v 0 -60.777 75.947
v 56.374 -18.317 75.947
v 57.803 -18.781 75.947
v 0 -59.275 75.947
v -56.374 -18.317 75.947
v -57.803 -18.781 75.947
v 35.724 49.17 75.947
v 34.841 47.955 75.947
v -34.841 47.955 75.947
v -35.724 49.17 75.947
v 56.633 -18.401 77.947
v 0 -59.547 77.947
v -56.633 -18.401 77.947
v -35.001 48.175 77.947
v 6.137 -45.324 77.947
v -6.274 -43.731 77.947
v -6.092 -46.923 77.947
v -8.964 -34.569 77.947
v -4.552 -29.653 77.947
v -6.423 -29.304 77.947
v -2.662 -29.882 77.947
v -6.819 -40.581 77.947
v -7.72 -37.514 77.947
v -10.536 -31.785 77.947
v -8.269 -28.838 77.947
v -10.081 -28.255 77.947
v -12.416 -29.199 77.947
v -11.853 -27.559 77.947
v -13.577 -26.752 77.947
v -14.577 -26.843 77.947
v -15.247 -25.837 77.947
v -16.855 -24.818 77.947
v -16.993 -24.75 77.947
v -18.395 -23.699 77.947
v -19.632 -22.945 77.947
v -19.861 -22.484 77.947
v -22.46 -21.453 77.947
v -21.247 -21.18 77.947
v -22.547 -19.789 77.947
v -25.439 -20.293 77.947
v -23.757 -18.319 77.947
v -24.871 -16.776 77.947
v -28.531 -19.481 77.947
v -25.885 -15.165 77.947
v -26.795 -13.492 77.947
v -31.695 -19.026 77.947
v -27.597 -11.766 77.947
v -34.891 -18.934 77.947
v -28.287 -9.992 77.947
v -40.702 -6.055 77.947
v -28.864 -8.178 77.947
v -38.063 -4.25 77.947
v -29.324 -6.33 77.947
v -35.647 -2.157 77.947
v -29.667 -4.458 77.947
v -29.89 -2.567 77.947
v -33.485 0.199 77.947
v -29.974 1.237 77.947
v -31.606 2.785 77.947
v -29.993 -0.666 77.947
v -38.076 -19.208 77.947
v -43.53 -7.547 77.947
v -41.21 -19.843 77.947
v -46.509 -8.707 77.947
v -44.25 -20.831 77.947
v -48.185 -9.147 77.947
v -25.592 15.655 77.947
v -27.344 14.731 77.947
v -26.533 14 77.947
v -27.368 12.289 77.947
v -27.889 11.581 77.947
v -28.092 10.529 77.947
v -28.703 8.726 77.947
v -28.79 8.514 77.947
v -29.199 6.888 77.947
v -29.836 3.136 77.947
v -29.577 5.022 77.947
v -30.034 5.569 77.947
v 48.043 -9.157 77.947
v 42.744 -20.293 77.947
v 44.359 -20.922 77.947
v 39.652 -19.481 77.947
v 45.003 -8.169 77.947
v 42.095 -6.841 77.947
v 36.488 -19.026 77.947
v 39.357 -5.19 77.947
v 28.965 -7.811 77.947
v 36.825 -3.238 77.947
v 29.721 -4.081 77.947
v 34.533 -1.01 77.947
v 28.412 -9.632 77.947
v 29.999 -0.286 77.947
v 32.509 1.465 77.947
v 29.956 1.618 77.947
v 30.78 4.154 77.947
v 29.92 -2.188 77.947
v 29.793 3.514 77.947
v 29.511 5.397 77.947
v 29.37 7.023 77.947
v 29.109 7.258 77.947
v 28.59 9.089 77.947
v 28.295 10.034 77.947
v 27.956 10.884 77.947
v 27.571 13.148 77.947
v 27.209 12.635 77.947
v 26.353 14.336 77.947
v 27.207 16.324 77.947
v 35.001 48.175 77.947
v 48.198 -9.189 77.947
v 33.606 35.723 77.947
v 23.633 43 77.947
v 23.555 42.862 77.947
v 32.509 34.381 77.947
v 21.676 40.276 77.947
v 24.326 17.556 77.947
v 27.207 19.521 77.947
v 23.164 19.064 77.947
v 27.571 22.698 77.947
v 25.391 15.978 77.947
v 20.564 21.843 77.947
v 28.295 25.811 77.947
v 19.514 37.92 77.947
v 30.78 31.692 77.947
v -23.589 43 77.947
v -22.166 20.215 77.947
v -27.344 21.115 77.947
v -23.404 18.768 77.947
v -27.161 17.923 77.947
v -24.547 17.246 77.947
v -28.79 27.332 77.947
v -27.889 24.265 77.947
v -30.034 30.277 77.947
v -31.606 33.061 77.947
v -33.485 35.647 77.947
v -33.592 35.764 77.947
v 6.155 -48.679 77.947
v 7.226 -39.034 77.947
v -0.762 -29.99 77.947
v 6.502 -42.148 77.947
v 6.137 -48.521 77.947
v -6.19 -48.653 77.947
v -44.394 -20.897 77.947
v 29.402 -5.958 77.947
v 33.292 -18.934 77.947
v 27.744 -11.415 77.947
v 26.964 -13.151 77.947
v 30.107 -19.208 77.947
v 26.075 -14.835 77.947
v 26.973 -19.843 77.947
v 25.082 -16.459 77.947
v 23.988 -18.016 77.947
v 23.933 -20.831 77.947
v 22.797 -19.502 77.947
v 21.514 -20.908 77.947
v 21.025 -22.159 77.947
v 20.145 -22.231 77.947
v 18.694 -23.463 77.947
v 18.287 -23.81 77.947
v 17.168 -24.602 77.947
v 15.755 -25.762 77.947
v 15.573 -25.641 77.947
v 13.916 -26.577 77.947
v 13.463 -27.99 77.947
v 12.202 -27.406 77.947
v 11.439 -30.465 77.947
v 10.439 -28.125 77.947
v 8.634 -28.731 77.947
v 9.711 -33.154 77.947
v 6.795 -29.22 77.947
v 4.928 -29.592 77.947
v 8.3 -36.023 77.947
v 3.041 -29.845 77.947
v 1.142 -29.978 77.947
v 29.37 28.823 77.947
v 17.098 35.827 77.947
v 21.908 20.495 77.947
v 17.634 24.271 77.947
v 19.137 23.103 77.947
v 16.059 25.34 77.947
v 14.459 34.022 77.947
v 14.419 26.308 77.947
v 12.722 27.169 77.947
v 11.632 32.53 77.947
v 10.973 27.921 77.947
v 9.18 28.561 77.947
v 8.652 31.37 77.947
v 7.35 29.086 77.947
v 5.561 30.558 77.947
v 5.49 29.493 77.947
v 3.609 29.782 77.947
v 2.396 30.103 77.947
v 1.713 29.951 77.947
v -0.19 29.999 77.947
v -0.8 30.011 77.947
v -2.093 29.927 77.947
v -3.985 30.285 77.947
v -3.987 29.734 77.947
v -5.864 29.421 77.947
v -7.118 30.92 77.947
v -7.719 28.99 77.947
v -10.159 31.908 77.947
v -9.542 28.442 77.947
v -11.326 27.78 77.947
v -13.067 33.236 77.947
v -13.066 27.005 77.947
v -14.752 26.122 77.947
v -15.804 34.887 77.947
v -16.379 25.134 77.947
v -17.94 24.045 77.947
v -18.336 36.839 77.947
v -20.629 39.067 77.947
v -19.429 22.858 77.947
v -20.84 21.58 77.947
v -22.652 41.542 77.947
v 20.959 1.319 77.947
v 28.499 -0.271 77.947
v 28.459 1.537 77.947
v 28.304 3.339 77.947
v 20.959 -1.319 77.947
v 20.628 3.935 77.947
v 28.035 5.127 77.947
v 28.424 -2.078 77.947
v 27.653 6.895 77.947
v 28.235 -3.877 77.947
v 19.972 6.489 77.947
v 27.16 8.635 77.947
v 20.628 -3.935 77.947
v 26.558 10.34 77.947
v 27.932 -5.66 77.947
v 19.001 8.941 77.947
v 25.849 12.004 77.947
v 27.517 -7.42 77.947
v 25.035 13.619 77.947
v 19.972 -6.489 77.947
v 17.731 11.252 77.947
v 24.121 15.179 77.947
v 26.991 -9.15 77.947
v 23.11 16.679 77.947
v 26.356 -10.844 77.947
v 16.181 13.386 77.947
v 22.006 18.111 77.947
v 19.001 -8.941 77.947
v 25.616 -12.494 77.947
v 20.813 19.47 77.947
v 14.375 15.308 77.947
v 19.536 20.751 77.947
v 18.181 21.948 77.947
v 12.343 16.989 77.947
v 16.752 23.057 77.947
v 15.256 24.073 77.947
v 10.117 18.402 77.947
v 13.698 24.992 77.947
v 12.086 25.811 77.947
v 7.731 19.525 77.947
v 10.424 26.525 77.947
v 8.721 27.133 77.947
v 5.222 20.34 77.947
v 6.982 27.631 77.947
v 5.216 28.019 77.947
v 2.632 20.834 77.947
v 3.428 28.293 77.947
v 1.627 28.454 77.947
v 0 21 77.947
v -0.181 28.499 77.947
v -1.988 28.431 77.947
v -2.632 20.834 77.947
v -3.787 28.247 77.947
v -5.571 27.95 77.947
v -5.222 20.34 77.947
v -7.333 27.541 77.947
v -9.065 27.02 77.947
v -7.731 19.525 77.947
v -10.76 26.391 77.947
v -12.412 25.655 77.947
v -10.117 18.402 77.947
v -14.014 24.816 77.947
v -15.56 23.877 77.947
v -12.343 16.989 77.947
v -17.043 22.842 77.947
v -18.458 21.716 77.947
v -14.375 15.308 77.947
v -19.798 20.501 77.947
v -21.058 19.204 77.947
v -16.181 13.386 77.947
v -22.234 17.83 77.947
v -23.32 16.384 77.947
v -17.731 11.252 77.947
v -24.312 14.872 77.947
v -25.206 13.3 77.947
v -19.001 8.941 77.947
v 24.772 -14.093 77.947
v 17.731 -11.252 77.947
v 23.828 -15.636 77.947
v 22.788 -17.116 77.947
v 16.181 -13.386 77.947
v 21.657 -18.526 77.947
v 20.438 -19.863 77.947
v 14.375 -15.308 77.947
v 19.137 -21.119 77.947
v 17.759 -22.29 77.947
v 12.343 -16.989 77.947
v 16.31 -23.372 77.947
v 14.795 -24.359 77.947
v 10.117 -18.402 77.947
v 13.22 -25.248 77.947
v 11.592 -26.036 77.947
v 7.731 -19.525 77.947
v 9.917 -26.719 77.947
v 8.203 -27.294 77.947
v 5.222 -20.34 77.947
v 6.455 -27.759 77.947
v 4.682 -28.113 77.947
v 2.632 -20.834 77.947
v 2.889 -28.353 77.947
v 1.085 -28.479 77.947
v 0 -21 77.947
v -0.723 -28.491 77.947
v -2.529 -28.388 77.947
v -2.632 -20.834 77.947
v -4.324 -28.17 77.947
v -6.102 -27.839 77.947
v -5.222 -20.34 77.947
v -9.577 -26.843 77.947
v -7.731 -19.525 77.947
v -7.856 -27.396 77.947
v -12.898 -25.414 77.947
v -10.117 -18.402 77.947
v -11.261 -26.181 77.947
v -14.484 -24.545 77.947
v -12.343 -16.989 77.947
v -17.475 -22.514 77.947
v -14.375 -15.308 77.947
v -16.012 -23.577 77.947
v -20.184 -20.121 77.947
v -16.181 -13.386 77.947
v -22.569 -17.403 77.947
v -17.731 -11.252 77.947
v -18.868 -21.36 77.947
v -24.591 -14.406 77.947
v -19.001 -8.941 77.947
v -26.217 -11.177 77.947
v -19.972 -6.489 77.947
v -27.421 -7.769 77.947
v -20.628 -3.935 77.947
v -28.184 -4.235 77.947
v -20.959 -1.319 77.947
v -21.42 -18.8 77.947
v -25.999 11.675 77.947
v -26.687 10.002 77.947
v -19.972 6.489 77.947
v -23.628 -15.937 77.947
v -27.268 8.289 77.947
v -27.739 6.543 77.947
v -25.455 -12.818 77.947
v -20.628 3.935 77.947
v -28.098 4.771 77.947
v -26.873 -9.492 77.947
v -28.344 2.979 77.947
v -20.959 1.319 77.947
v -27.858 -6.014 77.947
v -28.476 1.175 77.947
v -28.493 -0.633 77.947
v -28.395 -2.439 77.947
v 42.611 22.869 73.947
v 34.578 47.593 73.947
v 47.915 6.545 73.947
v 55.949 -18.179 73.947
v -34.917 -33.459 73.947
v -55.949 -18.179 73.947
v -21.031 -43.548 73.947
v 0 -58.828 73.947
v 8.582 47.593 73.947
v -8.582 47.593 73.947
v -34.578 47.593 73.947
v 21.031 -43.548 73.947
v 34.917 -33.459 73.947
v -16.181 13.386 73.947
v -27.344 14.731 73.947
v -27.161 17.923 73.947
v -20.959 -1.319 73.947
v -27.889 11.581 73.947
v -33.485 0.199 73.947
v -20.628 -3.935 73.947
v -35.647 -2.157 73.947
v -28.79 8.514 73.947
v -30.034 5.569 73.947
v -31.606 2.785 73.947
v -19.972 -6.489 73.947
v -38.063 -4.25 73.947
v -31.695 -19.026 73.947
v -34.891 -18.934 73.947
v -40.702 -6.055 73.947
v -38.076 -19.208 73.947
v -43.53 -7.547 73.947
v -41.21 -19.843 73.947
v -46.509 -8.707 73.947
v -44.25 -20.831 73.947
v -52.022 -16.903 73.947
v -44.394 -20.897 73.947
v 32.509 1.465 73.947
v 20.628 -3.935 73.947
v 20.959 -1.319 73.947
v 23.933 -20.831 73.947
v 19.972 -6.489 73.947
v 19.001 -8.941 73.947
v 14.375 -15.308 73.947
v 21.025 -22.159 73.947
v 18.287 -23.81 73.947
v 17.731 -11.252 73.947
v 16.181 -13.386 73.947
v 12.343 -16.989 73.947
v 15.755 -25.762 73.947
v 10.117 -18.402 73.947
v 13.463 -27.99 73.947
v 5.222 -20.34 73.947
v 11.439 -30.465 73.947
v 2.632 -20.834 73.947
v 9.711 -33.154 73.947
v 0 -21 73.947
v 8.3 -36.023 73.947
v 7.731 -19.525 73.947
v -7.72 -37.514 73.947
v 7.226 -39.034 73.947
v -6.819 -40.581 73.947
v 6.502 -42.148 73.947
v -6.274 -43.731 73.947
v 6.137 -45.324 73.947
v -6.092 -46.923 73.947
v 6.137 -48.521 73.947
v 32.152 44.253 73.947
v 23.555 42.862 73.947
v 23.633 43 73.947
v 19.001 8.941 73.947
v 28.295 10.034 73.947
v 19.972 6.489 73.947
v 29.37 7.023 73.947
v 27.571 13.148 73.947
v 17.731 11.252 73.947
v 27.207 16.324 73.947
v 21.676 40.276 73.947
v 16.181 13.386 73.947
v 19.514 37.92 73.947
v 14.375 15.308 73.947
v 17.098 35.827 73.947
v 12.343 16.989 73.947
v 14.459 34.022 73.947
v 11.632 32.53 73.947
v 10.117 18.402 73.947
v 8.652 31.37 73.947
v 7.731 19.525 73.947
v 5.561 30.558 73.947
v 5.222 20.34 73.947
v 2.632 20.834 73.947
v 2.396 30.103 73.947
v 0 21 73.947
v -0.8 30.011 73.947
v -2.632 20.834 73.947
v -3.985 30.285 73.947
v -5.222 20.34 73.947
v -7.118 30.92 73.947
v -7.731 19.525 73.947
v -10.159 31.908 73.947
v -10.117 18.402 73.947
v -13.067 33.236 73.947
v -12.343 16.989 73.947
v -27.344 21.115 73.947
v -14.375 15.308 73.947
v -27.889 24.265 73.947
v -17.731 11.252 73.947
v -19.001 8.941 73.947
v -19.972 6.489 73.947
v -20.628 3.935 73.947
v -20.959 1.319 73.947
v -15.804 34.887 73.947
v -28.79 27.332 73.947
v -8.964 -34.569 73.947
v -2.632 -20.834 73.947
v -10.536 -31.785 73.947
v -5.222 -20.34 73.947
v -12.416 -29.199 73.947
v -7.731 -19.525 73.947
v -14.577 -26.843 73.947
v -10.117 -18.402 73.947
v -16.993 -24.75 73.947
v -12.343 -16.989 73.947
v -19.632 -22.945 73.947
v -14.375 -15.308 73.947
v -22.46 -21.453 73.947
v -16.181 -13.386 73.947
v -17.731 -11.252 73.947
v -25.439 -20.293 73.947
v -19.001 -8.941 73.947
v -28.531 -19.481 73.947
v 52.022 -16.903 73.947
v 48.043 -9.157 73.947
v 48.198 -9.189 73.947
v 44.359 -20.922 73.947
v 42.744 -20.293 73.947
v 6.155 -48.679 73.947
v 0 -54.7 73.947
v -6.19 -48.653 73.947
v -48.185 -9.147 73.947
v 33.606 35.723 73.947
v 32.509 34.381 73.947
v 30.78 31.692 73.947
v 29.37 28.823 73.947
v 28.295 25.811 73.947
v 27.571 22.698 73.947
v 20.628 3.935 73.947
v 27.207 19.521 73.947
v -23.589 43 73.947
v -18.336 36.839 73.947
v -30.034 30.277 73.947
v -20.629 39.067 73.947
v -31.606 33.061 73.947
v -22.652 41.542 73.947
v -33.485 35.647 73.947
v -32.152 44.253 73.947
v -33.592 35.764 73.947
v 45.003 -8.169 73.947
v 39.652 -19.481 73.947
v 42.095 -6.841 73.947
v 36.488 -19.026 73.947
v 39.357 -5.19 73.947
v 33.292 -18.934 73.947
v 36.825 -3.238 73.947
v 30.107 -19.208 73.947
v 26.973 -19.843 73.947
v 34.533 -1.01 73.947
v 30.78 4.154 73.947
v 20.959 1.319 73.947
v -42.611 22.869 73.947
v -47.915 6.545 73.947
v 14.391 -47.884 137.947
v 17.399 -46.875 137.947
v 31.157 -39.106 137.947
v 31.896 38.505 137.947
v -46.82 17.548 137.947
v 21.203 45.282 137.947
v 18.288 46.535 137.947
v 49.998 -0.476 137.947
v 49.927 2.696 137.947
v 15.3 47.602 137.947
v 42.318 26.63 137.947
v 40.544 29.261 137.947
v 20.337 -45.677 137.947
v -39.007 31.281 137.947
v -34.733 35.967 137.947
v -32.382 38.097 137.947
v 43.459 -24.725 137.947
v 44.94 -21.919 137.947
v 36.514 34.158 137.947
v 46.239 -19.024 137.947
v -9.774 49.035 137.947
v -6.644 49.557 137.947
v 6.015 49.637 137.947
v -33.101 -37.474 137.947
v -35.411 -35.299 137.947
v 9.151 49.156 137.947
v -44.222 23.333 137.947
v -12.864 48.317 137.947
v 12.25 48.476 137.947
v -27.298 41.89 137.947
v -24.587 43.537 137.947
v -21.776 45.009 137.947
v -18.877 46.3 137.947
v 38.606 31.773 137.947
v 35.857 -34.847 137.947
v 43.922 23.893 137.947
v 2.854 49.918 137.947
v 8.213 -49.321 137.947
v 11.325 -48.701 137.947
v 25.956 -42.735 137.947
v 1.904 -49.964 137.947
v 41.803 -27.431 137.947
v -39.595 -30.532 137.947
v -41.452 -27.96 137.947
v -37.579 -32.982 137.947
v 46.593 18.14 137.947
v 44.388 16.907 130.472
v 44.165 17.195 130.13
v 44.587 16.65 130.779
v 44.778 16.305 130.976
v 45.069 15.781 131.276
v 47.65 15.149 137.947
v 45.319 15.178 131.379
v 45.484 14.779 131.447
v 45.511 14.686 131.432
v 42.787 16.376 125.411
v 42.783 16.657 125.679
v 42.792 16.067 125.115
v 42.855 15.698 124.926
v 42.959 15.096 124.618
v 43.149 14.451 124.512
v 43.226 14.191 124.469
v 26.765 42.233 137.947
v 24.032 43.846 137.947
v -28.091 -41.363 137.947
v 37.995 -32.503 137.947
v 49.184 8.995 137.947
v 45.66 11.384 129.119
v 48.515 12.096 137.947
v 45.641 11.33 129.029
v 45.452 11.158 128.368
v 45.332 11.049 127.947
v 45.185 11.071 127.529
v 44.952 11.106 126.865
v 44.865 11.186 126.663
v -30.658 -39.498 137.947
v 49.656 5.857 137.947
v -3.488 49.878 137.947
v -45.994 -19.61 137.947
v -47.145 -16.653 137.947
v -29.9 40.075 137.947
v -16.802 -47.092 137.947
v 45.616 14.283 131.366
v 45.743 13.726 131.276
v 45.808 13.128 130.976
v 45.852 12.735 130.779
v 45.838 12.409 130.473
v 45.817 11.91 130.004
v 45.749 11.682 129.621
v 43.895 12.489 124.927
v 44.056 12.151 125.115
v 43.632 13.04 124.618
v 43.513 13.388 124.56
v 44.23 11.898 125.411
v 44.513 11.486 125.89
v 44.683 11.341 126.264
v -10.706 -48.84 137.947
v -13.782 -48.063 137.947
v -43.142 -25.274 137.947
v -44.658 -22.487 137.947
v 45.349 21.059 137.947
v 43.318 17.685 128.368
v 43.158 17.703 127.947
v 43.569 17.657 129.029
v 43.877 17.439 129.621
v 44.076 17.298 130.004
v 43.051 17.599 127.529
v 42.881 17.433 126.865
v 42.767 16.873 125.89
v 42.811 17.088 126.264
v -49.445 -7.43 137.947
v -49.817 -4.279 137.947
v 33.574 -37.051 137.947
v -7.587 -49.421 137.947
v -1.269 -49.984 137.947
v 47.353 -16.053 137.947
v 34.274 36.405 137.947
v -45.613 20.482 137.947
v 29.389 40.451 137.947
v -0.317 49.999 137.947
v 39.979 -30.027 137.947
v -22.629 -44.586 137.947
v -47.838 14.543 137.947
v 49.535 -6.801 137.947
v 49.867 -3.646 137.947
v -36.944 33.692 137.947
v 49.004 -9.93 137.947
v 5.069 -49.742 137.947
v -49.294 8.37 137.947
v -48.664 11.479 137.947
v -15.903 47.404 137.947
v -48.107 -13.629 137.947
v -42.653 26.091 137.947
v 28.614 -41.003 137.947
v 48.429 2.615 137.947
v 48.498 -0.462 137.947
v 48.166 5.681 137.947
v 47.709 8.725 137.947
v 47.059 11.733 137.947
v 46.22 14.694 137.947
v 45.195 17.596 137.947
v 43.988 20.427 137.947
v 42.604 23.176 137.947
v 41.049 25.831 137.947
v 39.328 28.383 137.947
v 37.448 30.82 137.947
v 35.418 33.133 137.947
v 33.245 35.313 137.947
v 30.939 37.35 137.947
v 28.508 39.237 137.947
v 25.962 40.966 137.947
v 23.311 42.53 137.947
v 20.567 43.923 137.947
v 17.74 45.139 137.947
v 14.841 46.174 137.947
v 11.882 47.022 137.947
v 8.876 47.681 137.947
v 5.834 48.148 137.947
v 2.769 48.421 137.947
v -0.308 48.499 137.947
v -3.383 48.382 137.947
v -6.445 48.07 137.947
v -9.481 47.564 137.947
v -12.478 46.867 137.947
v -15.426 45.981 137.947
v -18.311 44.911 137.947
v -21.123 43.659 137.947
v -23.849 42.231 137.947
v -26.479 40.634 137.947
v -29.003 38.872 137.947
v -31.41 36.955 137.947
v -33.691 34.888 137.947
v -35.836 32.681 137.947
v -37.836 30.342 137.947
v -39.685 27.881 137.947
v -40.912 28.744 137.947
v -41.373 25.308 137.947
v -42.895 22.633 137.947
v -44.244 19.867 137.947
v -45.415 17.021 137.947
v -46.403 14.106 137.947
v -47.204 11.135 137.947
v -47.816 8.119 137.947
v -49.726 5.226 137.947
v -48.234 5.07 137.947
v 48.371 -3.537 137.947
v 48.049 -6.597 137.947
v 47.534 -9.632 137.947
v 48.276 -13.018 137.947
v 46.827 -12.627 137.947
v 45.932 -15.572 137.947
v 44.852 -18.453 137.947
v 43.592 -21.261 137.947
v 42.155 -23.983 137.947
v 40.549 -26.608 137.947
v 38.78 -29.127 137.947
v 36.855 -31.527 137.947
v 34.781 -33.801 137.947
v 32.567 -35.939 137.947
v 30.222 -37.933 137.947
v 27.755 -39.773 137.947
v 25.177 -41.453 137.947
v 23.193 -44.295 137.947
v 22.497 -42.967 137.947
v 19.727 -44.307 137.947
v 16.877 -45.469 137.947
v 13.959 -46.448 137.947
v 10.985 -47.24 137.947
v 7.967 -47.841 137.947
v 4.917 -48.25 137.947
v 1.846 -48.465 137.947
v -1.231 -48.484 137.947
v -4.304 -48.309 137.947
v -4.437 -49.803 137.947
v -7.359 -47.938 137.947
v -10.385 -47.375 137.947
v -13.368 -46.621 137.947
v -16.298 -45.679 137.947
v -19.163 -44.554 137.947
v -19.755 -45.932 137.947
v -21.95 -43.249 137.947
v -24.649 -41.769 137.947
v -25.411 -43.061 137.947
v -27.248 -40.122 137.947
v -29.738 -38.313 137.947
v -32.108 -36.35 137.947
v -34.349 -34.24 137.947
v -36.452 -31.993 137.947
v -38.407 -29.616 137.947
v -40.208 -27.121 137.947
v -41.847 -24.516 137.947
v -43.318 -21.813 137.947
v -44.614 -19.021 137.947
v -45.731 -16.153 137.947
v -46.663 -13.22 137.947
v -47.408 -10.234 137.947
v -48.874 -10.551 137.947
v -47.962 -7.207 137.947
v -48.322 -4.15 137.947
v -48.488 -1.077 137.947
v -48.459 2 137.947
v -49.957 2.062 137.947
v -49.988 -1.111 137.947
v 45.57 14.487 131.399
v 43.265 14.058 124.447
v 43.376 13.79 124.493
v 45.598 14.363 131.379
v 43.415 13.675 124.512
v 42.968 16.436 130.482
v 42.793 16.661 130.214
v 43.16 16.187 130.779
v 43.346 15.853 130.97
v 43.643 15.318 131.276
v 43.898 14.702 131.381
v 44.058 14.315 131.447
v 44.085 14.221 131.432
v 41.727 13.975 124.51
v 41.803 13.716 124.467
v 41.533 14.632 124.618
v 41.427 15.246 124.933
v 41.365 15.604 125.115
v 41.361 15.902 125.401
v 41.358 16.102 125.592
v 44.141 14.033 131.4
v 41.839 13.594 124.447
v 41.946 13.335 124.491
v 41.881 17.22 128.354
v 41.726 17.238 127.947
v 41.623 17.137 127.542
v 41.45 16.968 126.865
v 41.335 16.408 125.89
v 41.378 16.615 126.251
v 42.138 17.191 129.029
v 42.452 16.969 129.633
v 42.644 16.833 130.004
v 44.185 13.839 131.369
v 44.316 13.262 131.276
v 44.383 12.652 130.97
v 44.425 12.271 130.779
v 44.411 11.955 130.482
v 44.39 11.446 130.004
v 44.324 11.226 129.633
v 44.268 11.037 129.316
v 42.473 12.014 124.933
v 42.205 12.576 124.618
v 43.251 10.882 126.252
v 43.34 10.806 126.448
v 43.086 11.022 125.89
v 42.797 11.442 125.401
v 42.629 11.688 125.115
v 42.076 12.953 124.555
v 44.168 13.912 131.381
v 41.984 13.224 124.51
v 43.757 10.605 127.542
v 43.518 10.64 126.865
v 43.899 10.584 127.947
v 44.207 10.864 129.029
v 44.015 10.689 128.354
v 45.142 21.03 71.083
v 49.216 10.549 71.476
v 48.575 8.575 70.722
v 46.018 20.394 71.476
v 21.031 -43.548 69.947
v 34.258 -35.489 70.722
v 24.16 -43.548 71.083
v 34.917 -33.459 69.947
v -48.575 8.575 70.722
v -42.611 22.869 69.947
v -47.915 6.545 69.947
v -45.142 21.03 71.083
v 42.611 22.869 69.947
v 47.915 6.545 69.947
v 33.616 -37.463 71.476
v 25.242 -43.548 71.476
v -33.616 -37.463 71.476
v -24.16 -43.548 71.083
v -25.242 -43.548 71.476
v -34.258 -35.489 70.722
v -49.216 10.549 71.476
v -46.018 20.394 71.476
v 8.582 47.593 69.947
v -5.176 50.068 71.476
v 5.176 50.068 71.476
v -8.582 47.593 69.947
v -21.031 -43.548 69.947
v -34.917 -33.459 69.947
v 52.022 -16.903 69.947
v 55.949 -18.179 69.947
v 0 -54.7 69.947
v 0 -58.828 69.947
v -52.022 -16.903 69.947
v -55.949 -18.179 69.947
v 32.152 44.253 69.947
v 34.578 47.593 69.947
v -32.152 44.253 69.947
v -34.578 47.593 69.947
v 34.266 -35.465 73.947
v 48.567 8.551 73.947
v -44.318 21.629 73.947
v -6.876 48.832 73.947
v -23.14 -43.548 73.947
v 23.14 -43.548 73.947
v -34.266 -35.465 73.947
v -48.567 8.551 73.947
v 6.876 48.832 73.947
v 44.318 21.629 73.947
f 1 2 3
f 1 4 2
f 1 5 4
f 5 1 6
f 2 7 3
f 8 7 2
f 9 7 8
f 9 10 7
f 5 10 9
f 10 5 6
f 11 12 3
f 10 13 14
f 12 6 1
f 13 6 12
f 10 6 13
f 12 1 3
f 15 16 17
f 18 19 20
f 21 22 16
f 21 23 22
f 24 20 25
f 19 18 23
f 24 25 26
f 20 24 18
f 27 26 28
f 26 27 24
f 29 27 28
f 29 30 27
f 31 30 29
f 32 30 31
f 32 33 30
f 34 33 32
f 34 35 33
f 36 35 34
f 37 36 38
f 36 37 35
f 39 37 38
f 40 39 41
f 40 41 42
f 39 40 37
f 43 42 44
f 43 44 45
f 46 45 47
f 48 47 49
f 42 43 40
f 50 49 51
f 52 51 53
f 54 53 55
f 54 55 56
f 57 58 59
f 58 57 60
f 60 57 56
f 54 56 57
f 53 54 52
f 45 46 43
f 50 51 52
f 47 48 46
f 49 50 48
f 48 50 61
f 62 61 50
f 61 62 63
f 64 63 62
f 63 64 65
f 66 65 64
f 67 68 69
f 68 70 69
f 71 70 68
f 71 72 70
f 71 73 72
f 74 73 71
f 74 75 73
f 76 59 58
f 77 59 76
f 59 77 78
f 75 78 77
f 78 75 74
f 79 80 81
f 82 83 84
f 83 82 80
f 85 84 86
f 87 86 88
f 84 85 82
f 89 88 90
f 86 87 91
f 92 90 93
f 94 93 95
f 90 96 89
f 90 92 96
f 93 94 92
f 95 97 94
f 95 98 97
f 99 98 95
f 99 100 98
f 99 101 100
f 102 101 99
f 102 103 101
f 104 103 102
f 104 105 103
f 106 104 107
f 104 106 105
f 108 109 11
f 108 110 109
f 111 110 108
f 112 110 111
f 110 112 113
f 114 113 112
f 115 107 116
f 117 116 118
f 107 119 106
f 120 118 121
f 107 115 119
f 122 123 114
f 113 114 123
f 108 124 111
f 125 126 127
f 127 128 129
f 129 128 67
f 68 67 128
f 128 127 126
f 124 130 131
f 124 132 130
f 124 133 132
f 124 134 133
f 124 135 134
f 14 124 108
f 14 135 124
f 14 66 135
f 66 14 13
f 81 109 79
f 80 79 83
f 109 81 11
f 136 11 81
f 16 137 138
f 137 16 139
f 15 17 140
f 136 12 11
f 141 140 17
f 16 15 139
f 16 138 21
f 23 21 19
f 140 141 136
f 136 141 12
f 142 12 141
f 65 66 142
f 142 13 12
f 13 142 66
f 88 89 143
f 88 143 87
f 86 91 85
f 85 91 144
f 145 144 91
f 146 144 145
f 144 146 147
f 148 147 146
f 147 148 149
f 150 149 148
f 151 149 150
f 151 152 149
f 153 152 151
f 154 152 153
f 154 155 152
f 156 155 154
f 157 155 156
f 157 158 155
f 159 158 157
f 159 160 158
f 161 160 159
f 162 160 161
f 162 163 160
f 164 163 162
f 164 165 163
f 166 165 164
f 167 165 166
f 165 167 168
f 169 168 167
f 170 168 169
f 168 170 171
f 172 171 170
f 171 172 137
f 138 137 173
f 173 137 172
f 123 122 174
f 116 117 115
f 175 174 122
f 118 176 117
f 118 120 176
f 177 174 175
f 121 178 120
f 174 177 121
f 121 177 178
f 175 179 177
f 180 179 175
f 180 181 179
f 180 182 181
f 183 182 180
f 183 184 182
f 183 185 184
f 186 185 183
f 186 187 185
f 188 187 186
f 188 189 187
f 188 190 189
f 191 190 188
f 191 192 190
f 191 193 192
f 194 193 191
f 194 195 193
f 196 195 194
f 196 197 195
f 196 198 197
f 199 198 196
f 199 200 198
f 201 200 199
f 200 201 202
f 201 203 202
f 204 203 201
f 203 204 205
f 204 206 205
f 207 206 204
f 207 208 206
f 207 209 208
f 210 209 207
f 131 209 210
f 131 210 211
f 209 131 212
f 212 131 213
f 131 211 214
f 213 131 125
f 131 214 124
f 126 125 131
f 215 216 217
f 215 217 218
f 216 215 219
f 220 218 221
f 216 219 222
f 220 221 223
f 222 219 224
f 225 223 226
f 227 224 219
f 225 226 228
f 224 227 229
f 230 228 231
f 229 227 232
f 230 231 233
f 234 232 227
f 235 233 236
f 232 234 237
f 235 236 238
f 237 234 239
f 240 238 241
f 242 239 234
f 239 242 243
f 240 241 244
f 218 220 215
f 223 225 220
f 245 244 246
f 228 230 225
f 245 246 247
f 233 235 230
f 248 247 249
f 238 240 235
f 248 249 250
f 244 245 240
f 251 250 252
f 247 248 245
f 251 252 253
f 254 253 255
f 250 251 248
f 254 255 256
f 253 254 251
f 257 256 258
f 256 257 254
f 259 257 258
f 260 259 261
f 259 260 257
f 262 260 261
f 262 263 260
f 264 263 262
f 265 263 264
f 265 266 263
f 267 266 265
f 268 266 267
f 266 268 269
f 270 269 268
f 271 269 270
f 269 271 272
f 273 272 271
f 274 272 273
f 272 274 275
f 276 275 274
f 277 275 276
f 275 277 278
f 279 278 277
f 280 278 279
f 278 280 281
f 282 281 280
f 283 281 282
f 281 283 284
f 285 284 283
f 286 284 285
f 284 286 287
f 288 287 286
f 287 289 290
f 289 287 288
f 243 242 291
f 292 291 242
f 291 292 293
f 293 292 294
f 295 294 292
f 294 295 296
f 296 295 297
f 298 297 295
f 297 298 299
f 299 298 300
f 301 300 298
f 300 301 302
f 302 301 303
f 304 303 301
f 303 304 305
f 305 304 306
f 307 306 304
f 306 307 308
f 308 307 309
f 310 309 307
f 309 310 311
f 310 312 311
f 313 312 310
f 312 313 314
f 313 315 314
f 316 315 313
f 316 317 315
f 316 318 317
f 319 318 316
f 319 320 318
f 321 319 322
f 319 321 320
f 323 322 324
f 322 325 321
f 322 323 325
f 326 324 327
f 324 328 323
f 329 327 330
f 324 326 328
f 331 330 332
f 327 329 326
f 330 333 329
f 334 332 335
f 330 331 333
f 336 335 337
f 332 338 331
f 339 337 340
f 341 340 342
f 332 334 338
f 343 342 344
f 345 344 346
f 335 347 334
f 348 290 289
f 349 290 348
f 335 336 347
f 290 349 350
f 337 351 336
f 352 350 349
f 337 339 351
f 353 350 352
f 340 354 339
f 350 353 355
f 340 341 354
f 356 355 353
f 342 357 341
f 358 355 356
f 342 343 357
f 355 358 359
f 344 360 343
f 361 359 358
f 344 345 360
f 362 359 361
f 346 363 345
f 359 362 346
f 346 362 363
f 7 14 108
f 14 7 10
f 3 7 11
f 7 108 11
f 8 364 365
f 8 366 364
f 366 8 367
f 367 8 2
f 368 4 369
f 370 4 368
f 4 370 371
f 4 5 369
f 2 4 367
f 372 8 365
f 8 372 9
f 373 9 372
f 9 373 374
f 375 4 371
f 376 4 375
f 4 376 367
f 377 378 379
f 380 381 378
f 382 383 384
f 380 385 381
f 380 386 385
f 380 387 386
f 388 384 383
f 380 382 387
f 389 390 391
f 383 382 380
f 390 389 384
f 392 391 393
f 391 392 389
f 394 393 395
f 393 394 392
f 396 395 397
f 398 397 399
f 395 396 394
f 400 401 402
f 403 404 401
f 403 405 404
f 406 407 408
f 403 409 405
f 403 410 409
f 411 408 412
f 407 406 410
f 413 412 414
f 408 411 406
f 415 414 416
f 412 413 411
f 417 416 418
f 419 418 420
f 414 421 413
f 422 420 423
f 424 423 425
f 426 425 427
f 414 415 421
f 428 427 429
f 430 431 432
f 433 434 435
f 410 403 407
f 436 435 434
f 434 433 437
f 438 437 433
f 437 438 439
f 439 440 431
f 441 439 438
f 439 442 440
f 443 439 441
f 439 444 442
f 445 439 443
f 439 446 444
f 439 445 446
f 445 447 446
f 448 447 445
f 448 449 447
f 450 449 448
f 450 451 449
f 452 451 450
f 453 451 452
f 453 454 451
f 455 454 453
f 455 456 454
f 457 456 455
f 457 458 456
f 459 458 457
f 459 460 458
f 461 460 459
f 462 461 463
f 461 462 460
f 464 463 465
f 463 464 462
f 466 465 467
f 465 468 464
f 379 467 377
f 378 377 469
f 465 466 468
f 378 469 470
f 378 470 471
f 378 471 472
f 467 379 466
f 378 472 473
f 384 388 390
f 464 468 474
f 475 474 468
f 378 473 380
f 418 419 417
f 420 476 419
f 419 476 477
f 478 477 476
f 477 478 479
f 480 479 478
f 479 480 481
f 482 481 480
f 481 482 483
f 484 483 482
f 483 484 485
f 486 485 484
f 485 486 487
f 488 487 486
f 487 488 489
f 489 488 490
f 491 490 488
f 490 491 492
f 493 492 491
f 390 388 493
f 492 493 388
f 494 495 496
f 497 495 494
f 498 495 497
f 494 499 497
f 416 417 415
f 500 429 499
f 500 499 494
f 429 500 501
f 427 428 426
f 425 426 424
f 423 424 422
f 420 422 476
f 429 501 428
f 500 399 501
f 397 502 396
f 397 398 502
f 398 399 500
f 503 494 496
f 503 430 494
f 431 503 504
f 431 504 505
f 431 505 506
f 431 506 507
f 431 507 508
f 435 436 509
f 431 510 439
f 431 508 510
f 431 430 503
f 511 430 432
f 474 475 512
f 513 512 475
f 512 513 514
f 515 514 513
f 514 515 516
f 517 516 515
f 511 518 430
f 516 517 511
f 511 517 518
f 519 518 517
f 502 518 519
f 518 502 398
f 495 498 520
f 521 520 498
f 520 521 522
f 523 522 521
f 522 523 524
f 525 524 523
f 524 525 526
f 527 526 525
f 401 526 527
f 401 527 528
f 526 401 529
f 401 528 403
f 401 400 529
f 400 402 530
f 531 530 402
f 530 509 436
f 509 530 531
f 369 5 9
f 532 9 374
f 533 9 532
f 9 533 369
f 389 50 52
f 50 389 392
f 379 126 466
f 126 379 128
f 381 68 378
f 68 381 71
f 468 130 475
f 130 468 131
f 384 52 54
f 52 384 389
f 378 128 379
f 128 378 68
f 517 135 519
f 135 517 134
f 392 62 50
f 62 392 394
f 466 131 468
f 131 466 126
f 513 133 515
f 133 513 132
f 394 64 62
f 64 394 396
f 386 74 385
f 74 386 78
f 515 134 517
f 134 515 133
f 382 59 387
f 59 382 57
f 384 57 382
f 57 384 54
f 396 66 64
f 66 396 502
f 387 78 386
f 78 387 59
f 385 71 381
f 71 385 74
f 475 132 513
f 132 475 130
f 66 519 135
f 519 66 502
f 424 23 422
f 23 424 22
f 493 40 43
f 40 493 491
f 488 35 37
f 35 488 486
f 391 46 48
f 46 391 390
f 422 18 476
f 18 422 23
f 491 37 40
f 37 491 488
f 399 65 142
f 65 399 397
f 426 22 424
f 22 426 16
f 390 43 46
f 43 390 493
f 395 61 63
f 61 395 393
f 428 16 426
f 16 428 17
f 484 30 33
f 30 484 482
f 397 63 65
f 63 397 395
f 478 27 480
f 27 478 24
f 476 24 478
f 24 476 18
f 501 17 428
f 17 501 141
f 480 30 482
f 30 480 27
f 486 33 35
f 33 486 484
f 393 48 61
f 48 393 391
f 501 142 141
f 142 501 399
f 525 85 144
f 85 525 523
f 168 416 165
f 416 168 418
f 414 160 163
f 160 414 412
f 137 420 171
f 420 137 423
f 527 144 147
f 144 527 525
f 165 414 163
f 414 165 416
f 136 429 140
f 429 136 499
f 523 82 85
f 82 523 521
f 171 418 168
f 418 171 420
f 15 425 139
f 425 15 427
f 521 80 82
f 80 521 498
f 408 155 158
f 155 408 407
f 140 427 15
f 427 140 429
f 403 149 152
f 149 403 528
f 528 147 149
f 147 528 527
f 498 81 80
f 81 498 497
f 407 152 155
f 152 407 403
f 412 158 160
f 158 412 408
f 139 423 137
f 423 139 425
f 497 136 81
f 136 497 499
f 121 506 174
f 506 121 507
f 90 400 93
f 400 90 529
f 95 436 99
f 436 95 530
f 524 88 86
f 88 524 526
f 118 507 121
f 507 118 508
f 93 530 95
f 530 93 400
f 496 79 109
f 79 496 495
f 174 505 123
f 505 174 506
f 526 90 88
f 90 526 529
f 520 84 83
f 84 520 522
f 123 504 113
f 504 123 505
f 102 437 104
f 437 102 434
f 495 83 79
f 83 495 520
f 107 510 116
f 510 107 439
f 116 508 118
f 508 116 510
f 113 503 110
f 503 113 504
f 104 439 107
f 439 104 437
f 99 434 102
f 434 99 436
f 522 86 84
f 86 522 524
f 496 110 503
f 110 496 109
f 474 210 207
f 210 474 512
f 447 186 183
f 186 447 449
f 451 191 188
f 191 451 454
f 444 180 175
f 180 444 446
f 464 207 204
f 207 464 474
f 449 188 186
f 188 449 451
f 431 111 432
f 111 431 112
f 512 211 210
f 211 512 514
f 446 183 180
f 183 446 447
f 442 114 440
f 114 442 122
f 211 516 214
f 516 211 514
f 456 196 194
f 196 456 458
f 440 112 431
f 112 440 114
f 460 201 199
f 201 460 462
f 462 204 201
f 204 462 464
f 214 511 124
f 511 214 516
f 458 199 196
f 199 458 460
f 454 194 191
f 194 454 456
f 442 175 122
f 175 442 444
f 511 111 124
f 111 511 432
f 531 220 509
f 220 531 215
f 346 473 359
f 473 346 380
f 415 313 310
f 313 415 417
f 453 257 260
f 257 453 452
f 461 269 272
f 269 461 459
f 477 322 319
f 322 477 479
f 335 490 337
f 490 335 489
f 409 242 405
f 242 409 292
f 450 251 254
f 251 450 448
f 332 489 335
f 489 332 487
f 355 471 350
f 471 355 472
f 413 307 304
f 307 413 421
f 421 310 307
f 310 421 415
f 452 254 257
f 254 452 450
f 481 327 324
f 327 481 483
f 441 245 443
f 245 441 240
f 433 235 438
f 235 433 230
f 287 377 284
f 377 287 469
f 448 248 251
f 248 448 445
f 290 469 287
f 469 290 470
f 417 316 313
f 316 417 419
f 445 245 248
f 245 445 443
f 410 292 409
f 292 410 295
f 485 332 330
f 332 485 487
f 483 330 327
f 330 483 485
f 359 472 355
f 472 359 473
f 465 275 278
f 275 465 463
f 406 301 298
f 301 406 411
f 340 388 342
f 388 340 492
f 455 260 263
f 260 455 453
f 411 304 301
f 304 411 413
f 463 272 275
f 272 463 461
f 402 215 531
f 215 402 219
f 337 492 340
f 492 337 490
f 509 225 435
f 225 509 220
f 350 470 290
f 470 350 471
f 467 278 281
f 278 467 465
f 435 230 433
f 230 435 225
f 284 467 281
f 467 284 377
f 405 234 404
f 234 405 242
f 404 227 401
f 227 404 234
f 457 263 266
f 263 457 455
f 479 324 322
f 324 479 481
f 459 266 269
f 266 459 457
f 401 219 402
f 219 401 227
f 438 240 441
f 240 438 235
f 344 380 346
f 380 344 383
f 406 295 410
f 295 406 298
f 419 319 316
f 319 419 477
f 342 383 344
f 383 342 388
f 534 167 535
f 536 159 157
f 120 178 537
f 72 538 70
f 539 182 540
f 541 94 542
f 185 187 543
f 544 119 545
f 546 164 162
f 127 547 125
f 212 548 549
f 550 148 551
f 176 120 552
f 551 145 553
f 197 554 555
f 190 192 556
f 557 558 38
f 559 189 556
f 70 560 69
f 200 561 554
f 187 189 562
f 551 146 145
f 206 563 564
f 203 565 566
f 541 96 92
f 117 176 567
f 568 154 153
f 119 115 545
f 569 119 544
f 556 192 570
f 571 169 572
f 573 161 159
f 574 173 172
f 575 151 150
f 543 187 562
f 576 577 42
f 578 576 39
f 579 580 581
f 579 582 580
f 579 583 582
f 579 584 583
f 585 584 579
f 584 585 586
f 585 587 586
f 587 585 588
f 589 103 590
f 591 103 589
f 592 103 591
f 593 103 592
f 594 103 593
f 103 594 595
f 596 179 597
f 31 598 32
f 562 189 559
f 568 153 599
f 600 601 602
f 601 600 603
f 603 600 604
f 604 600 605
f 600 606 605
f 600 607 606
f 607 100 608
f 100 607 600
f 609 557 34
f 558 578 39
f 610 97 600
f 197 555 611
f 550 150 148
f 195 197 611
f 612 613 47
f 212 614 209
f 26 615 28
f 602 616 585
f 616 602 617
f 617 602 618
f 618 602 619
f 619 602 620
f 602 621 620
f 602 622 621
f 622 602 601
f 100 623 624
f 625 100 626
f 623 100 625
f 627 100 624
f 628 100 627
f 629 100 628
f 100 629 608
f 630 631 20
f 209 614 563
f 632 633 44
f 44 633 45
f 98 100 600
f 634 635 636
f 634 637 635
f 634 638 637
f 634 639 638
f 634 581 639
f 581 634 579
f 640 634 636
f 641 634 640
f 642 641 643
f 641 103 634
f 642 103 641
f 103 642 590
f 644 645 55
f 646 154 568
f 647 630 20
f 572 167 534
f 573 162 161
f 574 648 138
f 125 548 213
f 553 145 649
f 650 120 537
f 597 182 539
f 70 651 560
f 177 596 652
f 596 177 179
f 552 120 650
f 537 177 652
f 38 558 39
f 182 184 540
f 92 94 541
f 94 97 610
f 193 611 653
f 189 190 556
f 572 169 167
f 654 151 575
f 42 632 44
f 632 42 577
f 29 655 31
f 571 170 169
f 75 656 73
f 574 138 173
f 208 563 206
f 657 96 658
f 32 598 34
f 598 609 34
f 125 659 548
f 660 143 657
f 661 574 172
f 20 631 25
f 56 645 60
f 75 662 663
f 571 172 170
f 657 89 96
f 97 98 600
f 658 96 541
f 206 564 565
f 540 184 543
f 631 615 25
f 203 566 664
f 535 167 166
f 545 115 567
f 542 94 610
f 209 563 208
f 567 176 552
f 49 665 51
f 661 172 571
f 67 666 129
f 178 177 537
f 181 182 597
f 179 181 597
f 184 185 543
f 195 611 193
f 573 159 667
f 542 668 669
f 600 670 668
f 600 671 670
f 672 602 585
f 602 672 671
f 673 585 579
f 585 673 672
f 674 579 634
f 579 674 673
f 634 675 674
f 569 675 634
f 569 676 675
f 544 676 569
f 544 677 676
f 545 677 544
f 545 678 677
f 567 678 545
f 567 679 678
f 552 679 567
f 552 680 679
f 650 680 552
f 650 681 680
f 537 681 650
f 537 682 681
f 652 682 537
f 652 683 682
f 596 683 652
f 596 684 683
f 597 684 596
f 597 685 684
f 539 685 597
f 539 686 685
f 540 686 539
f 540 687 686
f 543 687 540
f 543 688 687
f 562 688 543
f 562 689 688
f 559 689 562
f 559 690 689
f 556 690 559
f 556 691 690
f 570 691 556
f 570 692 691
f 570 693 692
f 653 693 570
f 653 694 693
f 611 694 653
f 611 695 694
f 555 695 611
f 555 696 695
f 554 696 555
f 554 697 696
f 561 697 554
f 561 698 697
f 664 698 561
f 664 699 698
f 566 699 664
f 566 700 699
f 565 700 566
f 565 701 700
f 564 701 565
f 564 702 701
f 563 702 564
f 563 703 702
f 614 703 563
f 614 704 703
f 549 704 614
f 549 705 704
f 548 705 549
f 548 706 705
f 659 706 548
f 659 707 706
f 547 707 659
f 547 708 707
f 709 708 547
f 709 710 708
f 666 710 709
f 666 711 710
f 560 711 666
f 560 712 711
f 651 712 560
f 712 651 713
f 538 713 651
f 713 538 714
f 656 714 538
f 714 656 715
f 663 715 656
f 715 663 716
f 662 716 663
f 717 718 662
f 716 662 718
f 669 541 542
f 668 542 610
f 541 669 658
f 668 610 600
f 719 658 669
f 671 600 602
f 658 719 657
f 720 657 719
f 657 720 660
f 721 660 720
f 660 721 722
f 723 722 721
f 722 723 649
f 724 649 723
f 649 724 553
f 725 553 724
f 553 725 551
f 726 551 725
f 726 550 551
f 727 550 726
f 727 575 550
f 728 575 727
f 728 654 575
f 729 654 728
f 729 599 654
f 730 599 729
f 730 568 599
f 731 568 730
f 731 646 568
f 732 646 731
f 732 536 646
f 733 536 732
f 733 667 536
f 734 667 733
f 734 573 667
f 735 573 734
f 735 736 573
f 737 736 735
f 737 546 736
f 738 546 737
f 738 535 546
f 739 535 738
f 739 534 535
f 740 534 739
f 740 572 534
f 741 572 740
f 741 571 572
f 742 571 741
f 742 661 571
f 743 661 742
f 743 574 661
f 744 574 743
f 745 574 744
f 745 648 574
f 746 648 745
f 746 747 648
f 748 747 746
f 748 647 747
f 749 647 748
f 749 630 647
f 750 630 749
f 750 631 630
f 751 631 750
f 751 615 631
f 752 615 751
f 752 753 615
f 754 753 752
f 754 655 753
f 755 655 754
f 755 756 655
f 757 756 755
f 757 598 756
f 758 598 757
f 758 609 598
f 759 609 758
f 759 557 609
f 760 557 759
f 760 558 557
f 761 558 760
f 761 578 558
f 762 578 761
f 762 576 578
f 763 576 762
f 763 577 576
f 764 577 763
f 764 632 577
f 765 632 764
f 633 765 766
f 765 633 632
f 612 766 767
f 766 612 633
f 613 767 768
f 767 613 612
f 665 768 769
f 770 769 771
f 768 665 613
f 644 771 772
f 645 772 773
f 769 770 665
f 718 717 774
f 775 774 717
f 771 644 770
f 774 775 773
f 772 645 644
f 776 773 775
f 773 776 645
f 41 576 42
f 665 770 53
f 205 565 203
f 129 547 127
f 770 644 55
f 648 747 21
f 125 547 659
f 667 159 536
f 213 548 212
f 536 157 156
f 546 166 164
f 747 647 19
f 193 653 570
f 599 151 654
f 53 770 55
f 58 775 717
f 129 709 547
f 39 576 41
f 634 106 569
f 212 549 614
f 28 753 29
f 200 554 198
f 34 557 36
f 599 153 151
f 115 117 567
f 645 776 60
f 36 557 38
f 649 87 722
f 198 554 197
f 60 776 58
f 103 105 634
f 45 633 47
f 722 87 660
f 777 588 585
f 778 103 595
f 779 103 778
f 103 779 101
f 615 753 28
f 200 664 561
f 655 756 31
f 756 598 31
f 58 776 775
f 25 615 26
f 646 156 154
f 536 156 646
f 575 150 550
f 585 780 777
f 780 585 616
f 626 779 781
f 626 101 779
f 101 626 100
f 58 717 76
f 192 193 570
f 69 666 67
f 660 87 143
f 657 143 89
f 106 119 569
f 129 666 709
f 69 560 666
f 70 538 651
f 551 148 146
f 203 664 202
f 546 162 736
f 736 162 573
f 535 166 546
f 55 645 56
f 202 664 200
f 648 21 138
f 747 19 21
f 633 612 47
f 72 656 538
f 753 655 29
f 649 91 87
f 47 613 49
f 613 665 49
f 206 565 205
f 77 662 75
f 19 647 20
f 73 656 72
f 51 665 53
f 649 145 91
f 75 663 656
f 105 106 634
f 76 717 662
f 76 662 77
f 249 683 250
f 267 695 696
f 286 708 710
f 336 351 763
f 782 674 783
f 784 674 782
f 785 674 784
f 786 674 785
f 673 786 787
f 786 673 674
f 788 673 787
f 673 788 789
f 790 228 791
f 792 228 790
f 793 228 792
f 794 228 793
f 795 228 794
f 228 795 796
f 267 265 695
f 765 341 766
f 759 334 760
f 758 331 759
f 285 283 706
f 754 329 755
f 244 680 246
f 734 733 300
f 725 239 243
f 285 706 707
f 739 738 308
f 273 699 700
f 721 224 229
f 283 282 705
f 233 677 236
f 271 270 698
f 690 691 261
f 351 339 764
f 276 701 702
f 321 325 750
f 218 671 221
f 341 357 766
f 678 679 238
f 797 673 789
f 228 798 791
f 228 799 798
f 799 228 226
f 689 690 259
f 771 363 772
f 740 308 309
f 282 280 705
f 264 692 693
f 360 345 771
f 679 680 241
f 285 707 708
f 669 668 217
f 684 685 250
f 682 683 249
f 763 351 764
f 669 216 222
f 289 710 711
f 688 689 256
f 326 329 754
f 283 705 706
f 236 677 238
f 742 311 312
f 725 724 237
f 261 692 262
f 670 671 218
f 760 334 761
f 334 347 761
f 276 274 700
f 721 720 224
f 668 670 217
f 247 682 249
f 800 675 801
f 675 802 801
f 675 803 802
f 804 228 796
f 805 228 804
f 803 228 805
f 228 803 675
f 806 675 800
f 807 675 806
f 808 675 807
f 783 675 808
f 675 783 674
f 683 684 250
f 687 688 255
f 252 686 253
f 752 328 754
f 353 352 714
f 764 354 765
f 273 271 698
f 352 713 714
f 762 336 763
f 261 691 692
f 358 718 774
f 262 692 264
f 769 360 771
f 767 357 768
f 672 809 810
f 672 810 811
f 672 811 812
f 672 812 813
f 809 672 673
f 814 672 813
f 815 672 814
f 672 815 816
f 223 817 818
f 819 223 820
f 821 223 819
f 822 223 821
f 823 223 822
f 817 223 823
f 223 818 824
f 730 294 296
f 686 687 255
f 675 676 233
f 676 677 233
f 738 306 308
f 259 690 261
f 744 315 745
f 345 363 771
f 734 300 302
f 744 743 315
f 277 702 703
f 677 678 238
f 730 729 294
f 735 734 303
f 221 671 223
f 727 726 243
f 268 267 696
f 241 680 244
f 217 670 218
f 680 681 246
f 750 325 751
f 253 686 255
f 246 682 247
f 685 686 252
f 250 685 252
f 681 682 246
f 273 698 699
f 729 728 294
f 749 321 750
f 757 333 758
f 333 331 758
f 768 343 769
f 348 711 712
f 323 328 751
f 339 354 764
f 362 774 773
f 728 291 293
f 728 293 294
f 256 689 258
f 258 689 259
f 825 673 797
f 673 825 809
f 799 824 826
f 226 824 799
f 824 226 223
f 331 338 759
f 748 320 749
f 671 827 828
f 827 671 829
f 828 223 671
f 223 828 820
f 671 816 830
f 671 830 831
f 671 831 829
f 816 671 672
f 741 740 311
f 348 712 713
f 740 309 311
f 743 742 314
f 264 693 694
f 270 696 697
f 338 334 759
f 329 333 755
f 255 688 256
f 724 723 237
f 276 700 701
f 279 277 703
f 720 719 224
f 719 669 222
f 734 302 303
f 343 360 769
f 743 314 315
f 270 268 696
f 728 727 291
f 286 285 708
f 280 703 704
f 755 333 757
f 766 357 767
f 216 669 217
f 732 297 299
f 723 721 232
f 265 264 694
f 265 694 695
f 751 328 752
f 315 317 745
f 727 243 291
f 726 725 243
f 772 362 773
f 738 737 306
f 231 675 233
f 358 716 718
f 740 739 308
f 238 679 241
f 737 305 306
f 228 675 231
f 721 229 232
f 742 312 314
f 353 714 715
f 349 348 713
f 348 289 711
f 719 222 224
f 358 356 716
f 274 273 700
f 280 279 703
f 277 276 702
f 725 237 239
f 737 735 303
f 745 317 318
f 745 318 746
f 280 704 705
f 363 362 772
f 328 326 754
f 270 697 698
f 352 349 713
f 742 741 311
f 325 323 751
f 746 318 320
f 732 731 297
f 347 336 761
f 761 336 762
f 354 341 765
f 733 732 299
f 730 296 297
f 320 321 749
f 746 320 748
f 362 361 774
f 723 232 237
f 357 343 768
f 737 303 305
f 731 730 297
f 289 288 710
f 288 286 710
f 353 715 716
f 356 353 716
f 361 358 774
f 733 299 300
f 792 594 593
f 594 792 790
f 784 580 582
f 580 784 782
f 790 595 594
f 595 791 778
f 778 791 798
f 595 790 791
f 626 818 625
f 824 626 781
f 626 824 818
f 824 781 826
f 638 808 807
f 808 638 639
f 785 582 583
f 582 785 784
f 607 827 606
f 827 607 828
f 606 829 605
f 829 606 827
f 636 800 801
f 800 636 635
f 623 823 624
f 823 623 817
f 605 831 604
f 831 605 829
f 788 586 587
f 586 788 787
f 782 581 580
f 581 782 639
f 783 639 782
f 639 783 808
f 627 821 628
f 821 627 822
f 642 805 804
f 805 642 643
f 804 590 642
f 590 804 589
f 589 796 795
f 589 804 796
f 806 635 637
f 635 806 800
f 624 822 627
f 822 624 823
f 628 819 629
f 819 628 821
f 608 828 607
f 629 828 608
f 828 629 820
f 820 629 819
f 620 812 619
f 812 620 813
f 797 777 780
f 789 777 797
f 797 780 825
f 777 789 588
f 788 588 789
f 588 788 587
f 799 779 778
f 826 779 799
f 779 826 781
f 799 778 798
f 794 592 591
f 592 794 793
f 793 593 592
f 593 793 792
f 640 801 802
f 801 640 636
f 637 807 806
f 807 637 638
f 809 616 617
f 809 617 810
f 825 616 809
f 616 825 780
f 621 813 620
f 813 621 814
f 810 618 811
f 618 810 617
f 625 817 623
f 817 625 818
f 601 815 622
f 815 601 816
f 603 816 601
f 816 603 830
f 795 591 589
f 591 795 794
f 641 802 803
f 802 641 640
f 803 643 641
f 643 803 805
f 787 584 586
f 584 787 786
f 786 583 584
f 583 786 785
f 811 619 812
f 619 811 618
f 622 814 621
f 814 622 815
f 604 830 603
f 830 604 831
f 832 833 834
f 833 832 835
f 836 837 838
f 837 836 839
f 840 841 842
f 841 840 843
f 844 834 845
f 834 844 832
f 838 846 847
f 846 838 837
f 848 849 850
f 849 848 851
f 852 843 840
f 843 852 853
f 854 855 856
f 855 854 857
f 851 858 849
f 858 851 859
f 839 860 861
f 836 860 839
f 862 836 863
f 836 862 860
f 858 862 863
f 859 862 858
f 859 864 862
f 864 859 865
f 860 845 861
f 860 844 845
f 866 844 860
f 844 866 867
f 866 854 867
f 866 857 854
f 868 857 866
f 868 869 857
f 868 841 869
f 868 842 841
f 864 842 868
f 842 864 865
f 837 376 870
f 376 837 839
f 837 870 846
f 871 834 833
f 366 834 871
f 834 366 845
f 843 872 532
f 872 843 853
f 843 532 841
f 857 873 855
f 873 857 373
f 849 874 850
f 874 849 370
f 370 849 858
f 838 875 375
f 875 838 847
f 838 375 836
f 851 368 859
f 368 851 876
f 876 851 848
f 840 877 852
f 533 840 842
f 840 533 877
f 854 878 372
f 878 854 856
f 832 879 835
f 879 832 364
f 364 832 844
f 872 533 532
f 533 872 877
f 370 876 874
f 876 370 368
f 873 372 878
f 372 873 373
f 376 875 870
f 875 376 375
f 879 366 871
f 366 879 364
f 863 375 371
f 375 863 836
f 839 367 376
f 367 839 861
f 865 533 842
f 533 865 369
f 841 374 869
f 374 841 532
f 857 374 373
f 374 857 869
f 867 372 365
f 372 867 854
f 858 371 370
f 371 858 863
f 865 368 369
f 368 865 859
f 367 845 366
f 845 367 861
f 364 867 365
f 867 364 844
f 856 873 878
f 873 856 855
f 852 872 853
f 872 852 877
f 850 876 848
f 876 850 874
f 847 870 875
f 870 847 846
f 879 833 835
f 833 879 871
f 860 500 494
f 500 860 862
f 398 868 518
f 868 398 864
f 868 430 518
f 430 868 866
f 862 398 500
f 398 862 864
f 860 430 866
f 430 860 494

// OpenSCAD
// file: ../../lib/maths.scad
pi = 3.14159265358979;


////// PARABOLAS //////

//Standard parabola
function parabolaPoint(x, k) = k * x * x;

//Focal point equals Y where derivative of parabolaPoint is 1.
function focal_length(k) = parabolaPoint(0.5 / k, k);

//Cup shape
module outer_parabola(width, k, segments, base_thickness = 1) {
    for(i = [-segments:1:segments - 1]) {
        x1 = i * width / segments;
        x2 = (i + 1) * width / segments;
        polygon([[x1, -base_thickness], [x1, parabolaPoint(x1, k)],
            [x2, parabolaPoint(x2, k)], [x2, -base_thickness]],
            [[3, 2, 1, 0]]);
    }
}

//Bulge shape
module inner_parabola(width, k, segments) {
    assign(max_y = parabolaPoint(width, k))
    for(i = [-segments:1:segments - 1]) {
        x1 = i * width / segments;
        x2 = (i + 1) * width / segments;
        polygon([[x1, max_y], [x1, parabolaPoint(x1, k)],
            [x2, parabolaPoint(x2, k)], [x2, max_y]],
            [[0, 1, 2, 3]]);
    }
}

module parabolic_trough (length, width, k, segments) {
    rotate([90, 0, 90])
    linear_extrude(length, $fn = segments * 4)
    outer_parabola(width, k, segments);
}

module parabolic_dish (width, k, segments) {
    rotate_extrude($fn = segments * 4)
    intersection() {
        outer_parabola(width, k, segments);
        translate([0, -1])
        square([width + 1, parabolaPoint(width, k) + 2]);
    }
}

module parabolic_shell (width, k, segments, thickness) {
    rotate_extrude($fn = segments * 4)
    difference() {
        intersection() {
            outer_parabola(width, k, segments);
            translate([0, -1])
            square([width + 1, parabolaPoint(width, k) + 2]);
        }
        translate([0, -thickness])
        intersection() {
            outer_parabola(width, k, segments);
            translate([0, -1])
            square([width + 1, parabolaPoint(width, k) + 2]);
        }
    }
}

////////////////////////////////

// linear_extrude(1) outer_parabola(10, 0.2, segments = 20);

// color("green")
// linear_extrude(0.5) inner_parabola(10, 0.2, segments = 20);

// echo(str("Focal length = ", focal_length(0.2)));
// color("white")
// translate([0, focal_length(0.2)])
// cylinder(r = 0.25, $fn=20);

// translate([-10, 32, 0])
// parabolic_trough(20, 10, 0.1, 5);

// translate([0, 54, 0])
// parabolic_dish(10, 0.05, 5);

///////////////////////
//// END PARABOLAS ////
///////////////////////
// main file
version = 3;

hauteurExt = 155.894;
epaisseurParoi = 1.2;
// hauteurExt = 15.894;
// epaisseurParoi = 0.3;
diametreTrouBouchon = 1.6;
r = 0.19; // résolution d'impression sur l'axe Z
echelleReductionAjustementBouchon = 0.985;
hauteurInt = hauteurExt - 2 * epaisseurParoi;

use <../../lib/maths.scad>;

// color("white")
// #corps_ouvert();
// dodecahedron(hauteurExt);
// color("black")
#piedE27();
// render(convexity=2)
// piedE27_grande_ampoule_1();
// piedE27_grande_ampoule_2();
// base_pied();
//piedE14();



// Modif : Ajout pentagone à coller sur les pieds déjà imprimés
pentagone();
// translate([0,0,8+0.16]) rotate([0,0,180]) rotate([180,0]) pentagone();
// translate([0,0,8+2*0.16]) pentagone();
// translate([0,0,16+3*0.16]) rotate([0,0,180]) rotate([180,0]) pentagone();
module pentagone() {
    distance = hauteurExt/2;
    epaisseur = 2;
    hauteur = 4;
    radius = hauteurExt/2.65;
    // comment next line for multi print
    translate([0,0,distance-hauteur*epaisseur])
    difference() {
        union() {
            rotate([0,0,54])
                cylinder(hauteur, r=radius, $fn=5);
            // clip
            intersection() {
                rotate([0,0,54])
                    cylinder(hauteur*0.5, r1=radius, r2=radius+4, $fn=5);
                rotate([0,0,54+72/2])
                    cylinder(hauteur*0.5, r=radius-5, $fn=5);
            }
            translate([0,0,hauteur*0.5])
            intersection() {
                rotate([0,0,54])
                    cylinder(hauteur*0.5, r1=radius+4, r2=radius+2, $fn=5);
                rotate([0,0,54+72/2])
                    cylinder(hauteur*0.5, r=radius-5, $fn=5);
            }
        }
        rotate([0,0,54])
            cylinder(4, r=hauteurExt/2.85, $fn=5);

        translate([0,0,-distance+hauteur*epaisseur])
            dode_creux();
    }
}

module corps_ouvert() {
	difference() {
		dode_creux();
		decoupe_bouchon();
	}
}

module piedE27() {
    pied(diamTrou=42);
}
module piedE27_grande_ampoule_1() {
    pied_grande_ampoule_1(diamTrou=42);
}
module piedE27_grande_ampoule_2() {
    pied_grande_ampoule_2(diamTrou=42);
}
module piedE14() {
    pied(diamTrou=30);
}

distance = hauteurExt/2;
epaisseur = 2;
module pied(diamTrou) {
    difference() {
        union() {
            pentagone_feuillure();
        }
        union() {
            trou_douille(diamTrou);
            ouvertures();
        }
    }

    // base pied
    difference() {
        rotate([0,0,54]) translate([0,0,distance])
            cylinder(60, r=30, r2=50, $fn=99);
        rotate([0,0,54]) translate([0,0,distance])
            cylinder(60, r=28.5, r2=48.5, $fn=99);
        // spirale1(distance);
        // spirale2(distance);
        // Passe fil
        translate([0,0,distance+50]) rotate([0,90,18])
            cylinder(120, r=3.5, $fn=20);
    }
}

module pied_grande_ampoule_1(diamTrou) {
    difference() {
        union() {
            pentagone_feuillure();

            // partie haute
            difference() {
                translate([0, 0, 220]) rotate([180])
                    parabolic_shell(43, 0.08, 24, 6);
                translate([0, 0, distance - 51])
                    cube(size=100, center=true);
                translate([0, 0, distance + 50 + 76])
                    cube(size=100, center=true);
            }
            // partie haute
            // rotate([0,0,54]) translate([0,0,distance])
            //     cylinder(75, r=43.5, r2=30, $fn=29);

            // partie basse
            difference() {
                translate([0, 0, 123])
                    parabolic_shell(50, 0.04, 24, 6);
                translate([0, 0, distance - 50 + 75])
                    cube(size=100, center=true);
                translate([0, 0, distance + 50 + 75 + 60])
                    cube(size=100, center=true);
            }
            // partie basse
            // rotate([0,0,54]) translate([0,0,distance+75])
            //     cylinder(60, r=30, r2=44, $fn=29);

            // plateforme douille
            translate([0,0, distance + 75])
                cylinder(h=3, d=60, $fn=20);
        }
        render(convexity=2)
        union() {
            translate([0,0,78])
                trou_douille(diamTrou);
            // ouverture ampoule
            trou_douille(84);

            // partie haute
            // rotate([0,0,54]) translate([0,0,distance])
            //     cylinder(75, r=42, r2=28.5, $fn=29);
            // partie basse
            // rotate([0,0,54]) translate([0,0,distance+75])
            //     cylinder(60, r=28.5, r2=42.5, $fn=29);
        }
        // spirale1(distance);
        // spirale2(distance);
        // Passe fil
        translate([0,0,distance+50+75]) rotate([0,90,18])
            cylinder(120, r=3.5, $fn=20);
    }
}

module pied_grande_ampoule_2(diamTrou) {
    difference() {
        union() {
            pentagone_feuillure();

            // partie haute
            rotate([0,0,0]) translate([0, 0, distance+35+25])
                linear_extrude(height = 72+50, twist = 40, scale = 0.44, center = true, slices = 50)
                    difference() {
                        offset(r=10, $fn=40) {
                            circle(d=69, $fn=10, center = true);
                        }
                        offset(r=9) {
                            circle(d=69, $fn=10, center = true);
                        }
                    }
            // partie haute
            // rotate([0,0,54]) translate([0,0,distance])
            //     cylinder(75, r=43.5, r2=30, $fn=29);

            // partie basse
            // rotate([0,0,54]) translate([0, 0, distance + 102])
            //     linear_extrude(height = 72, twist = 1*72, scale = 0.7, center = true, slices = 200)
            //         difference() {
            //             offset(r=10, $fn=80) {
            //                 circle(d=60*0.7, $fn=10, center = true);
            //             }
            //             offset(r=9) {
            //                 circle(d=60*0.7, $fn=10, center = true);
            //             }
            //         }
            // partie basse
            // rotate([0,0,54]) translate([0,0,distance+75])
            //     cylinder(60, r=30, r2=44, $fn=29);

            // plateforme douille
            translate([0,0, distance + 65]) rotate([0,0,51])
                cylinder(h=3, d=59, $fn=20);

        }
        render(convexity=2)
        union() {
            translate([0,0,68])
                trou_douille(diamTrou);
            // ouverture ampoule
            trou_douille(84);

            // partie haute
            // rotate([0,0,54]) translate([0,0,distance])
            //     cylinder(75, r=42, r2=28.5, $fn=29);
            // partie basse
            // rotate([0,0,54]) translate([0,0,distance+75])
            //     cylinder(60, r=28.5, r2=42.5, $fn=29);
        }
        // spirale1(distance);
        // spirale2(distance);
        // Passe fil
        translate([0,0,distance+40+65]) rotate([0,90,18])
            cylinder(120, r=3.5, $fn=20);

        // coupe en bas
        render(convexity=2)
        translate([0, 0, distance + 250 + 65 + 48])
            cube(size=500, center=true);
    }
}

module base_pied() {
    scale([1.01, 1.01])
    difference() {
        // base
        render(convexity=2)
        translate([0,0, distance + 65 + 48]) rotate([0,0,54+36])
            cylinder(h=4, r=hauteurExt/2.618*0.81, $fn=66, center=true);

        // trou
        render(convexity=2)
        translate([0,0, distance + 65 + 46]) rotate([0,0,36])
            cylinder(h=8, d=38, $fn=30, center=true);


        // trou decagone
        render(convexity=2)
        translate([0,0, distance + 65 + 46]) rotate([0,0,36])
            cylinder(h=4, d=43, $fn=10, center=true);

        pied_grande_ampoule_2();
    }
}

module spirale1(distance) {
    rotate([0,0,54]) translate([0, 0, distance+30])
        linear_extrude(height = 60, twist = 180, scale = 2, center = true, slices = 200)
            circle(d=55, $fn=5, center = true);
    rotate([0,0,54]) translate([0, 0, distance+30])
        linear_extrude(height = 60, twist = 180, scale = 2, center = true, slices = 200)
            circle(d=52, $fn=5, center = true);
}

module spirale2(distance) {
    rotate([0,0,54]) translate([0, 0, distance+30])
        linear_extrude(height = 60, twist = 1*72, scale = 2, center = true, slices = 200)
            difference() {
                offset(r=10, $fn=80) {
                    circle(d=36, $fn=5, center = true);
                }
                offset(r=9) {
                    circle(d=36, $fn=5, center = true);
                }
            }
}

module pentagone_feuillure() {
    // fermeture (face) dodécaèdre
    rotate([0,0,54]) translate([0,0,distance-epaisseur])
        cylinder(epaisseur, r=hauteurExt/2.565, r2=hauteurExt/2.618, $fn=5);
    // Feuillure
    rotate([0,0,54]) translate([0,0,distance-2*epaisseur])
        cylinder(epaisseur, r=hauteurExt/2.65, r2=hauteurExt/2.63, $fn=5);
}

module trou_douille(diamTrou) {
    rotate([0,0,54]) translate([0,0,distance-2*epaisseur])
        cylinder(2*epaisseur+0.2, r=diamTrou/2, $fn=50);
}

module ouvertures() {
    for (i = [1:5]) {
      rotate([0, 0, 360/5*i])
        translate([0, 0, distance-epaisseur-10]) rotate([0,0,0])
          decoupe_demi_cercle();
    }
}

//decoupe_demi_cercle();
module decoupe_demi_cercle() {
    translate([0,58,0])
    difference() {
      linear_extrude(height = 30)
        circle(28, $fn=55);
        translate([0,25,0])
        cube(80, center=true);
    }
}

module dode_creux() {
	difference() {
		dodecahedron(hauteurExt);
		dodecahedron(hauteurInt);
	}
}

module decoupe_bouchon() {
    distance = hauteurInt/2+4*r;
//	rotate([0,0,54]) translate([0,0,distance])
//		cylinder(epaisseurParoi, r=hauteurExt/2.675, $fn=5);
	rotate([0,0,54]) translate([0,0,hauteurExt/2-1.99])
		cylinder(2, r=hauteurExt/2.5, $fn=5);
}

module dodecahedron(height) {
	scale([height,height,height]) {
		intersection() {
			cube([2,2,1], center = true);
			intersection_for(i=[0:4]) {
				rotate([0,0,72*i])
				rotate([116.565,0,0])
					cube([2,2,1], center = true);
			}
		}
	}
}
